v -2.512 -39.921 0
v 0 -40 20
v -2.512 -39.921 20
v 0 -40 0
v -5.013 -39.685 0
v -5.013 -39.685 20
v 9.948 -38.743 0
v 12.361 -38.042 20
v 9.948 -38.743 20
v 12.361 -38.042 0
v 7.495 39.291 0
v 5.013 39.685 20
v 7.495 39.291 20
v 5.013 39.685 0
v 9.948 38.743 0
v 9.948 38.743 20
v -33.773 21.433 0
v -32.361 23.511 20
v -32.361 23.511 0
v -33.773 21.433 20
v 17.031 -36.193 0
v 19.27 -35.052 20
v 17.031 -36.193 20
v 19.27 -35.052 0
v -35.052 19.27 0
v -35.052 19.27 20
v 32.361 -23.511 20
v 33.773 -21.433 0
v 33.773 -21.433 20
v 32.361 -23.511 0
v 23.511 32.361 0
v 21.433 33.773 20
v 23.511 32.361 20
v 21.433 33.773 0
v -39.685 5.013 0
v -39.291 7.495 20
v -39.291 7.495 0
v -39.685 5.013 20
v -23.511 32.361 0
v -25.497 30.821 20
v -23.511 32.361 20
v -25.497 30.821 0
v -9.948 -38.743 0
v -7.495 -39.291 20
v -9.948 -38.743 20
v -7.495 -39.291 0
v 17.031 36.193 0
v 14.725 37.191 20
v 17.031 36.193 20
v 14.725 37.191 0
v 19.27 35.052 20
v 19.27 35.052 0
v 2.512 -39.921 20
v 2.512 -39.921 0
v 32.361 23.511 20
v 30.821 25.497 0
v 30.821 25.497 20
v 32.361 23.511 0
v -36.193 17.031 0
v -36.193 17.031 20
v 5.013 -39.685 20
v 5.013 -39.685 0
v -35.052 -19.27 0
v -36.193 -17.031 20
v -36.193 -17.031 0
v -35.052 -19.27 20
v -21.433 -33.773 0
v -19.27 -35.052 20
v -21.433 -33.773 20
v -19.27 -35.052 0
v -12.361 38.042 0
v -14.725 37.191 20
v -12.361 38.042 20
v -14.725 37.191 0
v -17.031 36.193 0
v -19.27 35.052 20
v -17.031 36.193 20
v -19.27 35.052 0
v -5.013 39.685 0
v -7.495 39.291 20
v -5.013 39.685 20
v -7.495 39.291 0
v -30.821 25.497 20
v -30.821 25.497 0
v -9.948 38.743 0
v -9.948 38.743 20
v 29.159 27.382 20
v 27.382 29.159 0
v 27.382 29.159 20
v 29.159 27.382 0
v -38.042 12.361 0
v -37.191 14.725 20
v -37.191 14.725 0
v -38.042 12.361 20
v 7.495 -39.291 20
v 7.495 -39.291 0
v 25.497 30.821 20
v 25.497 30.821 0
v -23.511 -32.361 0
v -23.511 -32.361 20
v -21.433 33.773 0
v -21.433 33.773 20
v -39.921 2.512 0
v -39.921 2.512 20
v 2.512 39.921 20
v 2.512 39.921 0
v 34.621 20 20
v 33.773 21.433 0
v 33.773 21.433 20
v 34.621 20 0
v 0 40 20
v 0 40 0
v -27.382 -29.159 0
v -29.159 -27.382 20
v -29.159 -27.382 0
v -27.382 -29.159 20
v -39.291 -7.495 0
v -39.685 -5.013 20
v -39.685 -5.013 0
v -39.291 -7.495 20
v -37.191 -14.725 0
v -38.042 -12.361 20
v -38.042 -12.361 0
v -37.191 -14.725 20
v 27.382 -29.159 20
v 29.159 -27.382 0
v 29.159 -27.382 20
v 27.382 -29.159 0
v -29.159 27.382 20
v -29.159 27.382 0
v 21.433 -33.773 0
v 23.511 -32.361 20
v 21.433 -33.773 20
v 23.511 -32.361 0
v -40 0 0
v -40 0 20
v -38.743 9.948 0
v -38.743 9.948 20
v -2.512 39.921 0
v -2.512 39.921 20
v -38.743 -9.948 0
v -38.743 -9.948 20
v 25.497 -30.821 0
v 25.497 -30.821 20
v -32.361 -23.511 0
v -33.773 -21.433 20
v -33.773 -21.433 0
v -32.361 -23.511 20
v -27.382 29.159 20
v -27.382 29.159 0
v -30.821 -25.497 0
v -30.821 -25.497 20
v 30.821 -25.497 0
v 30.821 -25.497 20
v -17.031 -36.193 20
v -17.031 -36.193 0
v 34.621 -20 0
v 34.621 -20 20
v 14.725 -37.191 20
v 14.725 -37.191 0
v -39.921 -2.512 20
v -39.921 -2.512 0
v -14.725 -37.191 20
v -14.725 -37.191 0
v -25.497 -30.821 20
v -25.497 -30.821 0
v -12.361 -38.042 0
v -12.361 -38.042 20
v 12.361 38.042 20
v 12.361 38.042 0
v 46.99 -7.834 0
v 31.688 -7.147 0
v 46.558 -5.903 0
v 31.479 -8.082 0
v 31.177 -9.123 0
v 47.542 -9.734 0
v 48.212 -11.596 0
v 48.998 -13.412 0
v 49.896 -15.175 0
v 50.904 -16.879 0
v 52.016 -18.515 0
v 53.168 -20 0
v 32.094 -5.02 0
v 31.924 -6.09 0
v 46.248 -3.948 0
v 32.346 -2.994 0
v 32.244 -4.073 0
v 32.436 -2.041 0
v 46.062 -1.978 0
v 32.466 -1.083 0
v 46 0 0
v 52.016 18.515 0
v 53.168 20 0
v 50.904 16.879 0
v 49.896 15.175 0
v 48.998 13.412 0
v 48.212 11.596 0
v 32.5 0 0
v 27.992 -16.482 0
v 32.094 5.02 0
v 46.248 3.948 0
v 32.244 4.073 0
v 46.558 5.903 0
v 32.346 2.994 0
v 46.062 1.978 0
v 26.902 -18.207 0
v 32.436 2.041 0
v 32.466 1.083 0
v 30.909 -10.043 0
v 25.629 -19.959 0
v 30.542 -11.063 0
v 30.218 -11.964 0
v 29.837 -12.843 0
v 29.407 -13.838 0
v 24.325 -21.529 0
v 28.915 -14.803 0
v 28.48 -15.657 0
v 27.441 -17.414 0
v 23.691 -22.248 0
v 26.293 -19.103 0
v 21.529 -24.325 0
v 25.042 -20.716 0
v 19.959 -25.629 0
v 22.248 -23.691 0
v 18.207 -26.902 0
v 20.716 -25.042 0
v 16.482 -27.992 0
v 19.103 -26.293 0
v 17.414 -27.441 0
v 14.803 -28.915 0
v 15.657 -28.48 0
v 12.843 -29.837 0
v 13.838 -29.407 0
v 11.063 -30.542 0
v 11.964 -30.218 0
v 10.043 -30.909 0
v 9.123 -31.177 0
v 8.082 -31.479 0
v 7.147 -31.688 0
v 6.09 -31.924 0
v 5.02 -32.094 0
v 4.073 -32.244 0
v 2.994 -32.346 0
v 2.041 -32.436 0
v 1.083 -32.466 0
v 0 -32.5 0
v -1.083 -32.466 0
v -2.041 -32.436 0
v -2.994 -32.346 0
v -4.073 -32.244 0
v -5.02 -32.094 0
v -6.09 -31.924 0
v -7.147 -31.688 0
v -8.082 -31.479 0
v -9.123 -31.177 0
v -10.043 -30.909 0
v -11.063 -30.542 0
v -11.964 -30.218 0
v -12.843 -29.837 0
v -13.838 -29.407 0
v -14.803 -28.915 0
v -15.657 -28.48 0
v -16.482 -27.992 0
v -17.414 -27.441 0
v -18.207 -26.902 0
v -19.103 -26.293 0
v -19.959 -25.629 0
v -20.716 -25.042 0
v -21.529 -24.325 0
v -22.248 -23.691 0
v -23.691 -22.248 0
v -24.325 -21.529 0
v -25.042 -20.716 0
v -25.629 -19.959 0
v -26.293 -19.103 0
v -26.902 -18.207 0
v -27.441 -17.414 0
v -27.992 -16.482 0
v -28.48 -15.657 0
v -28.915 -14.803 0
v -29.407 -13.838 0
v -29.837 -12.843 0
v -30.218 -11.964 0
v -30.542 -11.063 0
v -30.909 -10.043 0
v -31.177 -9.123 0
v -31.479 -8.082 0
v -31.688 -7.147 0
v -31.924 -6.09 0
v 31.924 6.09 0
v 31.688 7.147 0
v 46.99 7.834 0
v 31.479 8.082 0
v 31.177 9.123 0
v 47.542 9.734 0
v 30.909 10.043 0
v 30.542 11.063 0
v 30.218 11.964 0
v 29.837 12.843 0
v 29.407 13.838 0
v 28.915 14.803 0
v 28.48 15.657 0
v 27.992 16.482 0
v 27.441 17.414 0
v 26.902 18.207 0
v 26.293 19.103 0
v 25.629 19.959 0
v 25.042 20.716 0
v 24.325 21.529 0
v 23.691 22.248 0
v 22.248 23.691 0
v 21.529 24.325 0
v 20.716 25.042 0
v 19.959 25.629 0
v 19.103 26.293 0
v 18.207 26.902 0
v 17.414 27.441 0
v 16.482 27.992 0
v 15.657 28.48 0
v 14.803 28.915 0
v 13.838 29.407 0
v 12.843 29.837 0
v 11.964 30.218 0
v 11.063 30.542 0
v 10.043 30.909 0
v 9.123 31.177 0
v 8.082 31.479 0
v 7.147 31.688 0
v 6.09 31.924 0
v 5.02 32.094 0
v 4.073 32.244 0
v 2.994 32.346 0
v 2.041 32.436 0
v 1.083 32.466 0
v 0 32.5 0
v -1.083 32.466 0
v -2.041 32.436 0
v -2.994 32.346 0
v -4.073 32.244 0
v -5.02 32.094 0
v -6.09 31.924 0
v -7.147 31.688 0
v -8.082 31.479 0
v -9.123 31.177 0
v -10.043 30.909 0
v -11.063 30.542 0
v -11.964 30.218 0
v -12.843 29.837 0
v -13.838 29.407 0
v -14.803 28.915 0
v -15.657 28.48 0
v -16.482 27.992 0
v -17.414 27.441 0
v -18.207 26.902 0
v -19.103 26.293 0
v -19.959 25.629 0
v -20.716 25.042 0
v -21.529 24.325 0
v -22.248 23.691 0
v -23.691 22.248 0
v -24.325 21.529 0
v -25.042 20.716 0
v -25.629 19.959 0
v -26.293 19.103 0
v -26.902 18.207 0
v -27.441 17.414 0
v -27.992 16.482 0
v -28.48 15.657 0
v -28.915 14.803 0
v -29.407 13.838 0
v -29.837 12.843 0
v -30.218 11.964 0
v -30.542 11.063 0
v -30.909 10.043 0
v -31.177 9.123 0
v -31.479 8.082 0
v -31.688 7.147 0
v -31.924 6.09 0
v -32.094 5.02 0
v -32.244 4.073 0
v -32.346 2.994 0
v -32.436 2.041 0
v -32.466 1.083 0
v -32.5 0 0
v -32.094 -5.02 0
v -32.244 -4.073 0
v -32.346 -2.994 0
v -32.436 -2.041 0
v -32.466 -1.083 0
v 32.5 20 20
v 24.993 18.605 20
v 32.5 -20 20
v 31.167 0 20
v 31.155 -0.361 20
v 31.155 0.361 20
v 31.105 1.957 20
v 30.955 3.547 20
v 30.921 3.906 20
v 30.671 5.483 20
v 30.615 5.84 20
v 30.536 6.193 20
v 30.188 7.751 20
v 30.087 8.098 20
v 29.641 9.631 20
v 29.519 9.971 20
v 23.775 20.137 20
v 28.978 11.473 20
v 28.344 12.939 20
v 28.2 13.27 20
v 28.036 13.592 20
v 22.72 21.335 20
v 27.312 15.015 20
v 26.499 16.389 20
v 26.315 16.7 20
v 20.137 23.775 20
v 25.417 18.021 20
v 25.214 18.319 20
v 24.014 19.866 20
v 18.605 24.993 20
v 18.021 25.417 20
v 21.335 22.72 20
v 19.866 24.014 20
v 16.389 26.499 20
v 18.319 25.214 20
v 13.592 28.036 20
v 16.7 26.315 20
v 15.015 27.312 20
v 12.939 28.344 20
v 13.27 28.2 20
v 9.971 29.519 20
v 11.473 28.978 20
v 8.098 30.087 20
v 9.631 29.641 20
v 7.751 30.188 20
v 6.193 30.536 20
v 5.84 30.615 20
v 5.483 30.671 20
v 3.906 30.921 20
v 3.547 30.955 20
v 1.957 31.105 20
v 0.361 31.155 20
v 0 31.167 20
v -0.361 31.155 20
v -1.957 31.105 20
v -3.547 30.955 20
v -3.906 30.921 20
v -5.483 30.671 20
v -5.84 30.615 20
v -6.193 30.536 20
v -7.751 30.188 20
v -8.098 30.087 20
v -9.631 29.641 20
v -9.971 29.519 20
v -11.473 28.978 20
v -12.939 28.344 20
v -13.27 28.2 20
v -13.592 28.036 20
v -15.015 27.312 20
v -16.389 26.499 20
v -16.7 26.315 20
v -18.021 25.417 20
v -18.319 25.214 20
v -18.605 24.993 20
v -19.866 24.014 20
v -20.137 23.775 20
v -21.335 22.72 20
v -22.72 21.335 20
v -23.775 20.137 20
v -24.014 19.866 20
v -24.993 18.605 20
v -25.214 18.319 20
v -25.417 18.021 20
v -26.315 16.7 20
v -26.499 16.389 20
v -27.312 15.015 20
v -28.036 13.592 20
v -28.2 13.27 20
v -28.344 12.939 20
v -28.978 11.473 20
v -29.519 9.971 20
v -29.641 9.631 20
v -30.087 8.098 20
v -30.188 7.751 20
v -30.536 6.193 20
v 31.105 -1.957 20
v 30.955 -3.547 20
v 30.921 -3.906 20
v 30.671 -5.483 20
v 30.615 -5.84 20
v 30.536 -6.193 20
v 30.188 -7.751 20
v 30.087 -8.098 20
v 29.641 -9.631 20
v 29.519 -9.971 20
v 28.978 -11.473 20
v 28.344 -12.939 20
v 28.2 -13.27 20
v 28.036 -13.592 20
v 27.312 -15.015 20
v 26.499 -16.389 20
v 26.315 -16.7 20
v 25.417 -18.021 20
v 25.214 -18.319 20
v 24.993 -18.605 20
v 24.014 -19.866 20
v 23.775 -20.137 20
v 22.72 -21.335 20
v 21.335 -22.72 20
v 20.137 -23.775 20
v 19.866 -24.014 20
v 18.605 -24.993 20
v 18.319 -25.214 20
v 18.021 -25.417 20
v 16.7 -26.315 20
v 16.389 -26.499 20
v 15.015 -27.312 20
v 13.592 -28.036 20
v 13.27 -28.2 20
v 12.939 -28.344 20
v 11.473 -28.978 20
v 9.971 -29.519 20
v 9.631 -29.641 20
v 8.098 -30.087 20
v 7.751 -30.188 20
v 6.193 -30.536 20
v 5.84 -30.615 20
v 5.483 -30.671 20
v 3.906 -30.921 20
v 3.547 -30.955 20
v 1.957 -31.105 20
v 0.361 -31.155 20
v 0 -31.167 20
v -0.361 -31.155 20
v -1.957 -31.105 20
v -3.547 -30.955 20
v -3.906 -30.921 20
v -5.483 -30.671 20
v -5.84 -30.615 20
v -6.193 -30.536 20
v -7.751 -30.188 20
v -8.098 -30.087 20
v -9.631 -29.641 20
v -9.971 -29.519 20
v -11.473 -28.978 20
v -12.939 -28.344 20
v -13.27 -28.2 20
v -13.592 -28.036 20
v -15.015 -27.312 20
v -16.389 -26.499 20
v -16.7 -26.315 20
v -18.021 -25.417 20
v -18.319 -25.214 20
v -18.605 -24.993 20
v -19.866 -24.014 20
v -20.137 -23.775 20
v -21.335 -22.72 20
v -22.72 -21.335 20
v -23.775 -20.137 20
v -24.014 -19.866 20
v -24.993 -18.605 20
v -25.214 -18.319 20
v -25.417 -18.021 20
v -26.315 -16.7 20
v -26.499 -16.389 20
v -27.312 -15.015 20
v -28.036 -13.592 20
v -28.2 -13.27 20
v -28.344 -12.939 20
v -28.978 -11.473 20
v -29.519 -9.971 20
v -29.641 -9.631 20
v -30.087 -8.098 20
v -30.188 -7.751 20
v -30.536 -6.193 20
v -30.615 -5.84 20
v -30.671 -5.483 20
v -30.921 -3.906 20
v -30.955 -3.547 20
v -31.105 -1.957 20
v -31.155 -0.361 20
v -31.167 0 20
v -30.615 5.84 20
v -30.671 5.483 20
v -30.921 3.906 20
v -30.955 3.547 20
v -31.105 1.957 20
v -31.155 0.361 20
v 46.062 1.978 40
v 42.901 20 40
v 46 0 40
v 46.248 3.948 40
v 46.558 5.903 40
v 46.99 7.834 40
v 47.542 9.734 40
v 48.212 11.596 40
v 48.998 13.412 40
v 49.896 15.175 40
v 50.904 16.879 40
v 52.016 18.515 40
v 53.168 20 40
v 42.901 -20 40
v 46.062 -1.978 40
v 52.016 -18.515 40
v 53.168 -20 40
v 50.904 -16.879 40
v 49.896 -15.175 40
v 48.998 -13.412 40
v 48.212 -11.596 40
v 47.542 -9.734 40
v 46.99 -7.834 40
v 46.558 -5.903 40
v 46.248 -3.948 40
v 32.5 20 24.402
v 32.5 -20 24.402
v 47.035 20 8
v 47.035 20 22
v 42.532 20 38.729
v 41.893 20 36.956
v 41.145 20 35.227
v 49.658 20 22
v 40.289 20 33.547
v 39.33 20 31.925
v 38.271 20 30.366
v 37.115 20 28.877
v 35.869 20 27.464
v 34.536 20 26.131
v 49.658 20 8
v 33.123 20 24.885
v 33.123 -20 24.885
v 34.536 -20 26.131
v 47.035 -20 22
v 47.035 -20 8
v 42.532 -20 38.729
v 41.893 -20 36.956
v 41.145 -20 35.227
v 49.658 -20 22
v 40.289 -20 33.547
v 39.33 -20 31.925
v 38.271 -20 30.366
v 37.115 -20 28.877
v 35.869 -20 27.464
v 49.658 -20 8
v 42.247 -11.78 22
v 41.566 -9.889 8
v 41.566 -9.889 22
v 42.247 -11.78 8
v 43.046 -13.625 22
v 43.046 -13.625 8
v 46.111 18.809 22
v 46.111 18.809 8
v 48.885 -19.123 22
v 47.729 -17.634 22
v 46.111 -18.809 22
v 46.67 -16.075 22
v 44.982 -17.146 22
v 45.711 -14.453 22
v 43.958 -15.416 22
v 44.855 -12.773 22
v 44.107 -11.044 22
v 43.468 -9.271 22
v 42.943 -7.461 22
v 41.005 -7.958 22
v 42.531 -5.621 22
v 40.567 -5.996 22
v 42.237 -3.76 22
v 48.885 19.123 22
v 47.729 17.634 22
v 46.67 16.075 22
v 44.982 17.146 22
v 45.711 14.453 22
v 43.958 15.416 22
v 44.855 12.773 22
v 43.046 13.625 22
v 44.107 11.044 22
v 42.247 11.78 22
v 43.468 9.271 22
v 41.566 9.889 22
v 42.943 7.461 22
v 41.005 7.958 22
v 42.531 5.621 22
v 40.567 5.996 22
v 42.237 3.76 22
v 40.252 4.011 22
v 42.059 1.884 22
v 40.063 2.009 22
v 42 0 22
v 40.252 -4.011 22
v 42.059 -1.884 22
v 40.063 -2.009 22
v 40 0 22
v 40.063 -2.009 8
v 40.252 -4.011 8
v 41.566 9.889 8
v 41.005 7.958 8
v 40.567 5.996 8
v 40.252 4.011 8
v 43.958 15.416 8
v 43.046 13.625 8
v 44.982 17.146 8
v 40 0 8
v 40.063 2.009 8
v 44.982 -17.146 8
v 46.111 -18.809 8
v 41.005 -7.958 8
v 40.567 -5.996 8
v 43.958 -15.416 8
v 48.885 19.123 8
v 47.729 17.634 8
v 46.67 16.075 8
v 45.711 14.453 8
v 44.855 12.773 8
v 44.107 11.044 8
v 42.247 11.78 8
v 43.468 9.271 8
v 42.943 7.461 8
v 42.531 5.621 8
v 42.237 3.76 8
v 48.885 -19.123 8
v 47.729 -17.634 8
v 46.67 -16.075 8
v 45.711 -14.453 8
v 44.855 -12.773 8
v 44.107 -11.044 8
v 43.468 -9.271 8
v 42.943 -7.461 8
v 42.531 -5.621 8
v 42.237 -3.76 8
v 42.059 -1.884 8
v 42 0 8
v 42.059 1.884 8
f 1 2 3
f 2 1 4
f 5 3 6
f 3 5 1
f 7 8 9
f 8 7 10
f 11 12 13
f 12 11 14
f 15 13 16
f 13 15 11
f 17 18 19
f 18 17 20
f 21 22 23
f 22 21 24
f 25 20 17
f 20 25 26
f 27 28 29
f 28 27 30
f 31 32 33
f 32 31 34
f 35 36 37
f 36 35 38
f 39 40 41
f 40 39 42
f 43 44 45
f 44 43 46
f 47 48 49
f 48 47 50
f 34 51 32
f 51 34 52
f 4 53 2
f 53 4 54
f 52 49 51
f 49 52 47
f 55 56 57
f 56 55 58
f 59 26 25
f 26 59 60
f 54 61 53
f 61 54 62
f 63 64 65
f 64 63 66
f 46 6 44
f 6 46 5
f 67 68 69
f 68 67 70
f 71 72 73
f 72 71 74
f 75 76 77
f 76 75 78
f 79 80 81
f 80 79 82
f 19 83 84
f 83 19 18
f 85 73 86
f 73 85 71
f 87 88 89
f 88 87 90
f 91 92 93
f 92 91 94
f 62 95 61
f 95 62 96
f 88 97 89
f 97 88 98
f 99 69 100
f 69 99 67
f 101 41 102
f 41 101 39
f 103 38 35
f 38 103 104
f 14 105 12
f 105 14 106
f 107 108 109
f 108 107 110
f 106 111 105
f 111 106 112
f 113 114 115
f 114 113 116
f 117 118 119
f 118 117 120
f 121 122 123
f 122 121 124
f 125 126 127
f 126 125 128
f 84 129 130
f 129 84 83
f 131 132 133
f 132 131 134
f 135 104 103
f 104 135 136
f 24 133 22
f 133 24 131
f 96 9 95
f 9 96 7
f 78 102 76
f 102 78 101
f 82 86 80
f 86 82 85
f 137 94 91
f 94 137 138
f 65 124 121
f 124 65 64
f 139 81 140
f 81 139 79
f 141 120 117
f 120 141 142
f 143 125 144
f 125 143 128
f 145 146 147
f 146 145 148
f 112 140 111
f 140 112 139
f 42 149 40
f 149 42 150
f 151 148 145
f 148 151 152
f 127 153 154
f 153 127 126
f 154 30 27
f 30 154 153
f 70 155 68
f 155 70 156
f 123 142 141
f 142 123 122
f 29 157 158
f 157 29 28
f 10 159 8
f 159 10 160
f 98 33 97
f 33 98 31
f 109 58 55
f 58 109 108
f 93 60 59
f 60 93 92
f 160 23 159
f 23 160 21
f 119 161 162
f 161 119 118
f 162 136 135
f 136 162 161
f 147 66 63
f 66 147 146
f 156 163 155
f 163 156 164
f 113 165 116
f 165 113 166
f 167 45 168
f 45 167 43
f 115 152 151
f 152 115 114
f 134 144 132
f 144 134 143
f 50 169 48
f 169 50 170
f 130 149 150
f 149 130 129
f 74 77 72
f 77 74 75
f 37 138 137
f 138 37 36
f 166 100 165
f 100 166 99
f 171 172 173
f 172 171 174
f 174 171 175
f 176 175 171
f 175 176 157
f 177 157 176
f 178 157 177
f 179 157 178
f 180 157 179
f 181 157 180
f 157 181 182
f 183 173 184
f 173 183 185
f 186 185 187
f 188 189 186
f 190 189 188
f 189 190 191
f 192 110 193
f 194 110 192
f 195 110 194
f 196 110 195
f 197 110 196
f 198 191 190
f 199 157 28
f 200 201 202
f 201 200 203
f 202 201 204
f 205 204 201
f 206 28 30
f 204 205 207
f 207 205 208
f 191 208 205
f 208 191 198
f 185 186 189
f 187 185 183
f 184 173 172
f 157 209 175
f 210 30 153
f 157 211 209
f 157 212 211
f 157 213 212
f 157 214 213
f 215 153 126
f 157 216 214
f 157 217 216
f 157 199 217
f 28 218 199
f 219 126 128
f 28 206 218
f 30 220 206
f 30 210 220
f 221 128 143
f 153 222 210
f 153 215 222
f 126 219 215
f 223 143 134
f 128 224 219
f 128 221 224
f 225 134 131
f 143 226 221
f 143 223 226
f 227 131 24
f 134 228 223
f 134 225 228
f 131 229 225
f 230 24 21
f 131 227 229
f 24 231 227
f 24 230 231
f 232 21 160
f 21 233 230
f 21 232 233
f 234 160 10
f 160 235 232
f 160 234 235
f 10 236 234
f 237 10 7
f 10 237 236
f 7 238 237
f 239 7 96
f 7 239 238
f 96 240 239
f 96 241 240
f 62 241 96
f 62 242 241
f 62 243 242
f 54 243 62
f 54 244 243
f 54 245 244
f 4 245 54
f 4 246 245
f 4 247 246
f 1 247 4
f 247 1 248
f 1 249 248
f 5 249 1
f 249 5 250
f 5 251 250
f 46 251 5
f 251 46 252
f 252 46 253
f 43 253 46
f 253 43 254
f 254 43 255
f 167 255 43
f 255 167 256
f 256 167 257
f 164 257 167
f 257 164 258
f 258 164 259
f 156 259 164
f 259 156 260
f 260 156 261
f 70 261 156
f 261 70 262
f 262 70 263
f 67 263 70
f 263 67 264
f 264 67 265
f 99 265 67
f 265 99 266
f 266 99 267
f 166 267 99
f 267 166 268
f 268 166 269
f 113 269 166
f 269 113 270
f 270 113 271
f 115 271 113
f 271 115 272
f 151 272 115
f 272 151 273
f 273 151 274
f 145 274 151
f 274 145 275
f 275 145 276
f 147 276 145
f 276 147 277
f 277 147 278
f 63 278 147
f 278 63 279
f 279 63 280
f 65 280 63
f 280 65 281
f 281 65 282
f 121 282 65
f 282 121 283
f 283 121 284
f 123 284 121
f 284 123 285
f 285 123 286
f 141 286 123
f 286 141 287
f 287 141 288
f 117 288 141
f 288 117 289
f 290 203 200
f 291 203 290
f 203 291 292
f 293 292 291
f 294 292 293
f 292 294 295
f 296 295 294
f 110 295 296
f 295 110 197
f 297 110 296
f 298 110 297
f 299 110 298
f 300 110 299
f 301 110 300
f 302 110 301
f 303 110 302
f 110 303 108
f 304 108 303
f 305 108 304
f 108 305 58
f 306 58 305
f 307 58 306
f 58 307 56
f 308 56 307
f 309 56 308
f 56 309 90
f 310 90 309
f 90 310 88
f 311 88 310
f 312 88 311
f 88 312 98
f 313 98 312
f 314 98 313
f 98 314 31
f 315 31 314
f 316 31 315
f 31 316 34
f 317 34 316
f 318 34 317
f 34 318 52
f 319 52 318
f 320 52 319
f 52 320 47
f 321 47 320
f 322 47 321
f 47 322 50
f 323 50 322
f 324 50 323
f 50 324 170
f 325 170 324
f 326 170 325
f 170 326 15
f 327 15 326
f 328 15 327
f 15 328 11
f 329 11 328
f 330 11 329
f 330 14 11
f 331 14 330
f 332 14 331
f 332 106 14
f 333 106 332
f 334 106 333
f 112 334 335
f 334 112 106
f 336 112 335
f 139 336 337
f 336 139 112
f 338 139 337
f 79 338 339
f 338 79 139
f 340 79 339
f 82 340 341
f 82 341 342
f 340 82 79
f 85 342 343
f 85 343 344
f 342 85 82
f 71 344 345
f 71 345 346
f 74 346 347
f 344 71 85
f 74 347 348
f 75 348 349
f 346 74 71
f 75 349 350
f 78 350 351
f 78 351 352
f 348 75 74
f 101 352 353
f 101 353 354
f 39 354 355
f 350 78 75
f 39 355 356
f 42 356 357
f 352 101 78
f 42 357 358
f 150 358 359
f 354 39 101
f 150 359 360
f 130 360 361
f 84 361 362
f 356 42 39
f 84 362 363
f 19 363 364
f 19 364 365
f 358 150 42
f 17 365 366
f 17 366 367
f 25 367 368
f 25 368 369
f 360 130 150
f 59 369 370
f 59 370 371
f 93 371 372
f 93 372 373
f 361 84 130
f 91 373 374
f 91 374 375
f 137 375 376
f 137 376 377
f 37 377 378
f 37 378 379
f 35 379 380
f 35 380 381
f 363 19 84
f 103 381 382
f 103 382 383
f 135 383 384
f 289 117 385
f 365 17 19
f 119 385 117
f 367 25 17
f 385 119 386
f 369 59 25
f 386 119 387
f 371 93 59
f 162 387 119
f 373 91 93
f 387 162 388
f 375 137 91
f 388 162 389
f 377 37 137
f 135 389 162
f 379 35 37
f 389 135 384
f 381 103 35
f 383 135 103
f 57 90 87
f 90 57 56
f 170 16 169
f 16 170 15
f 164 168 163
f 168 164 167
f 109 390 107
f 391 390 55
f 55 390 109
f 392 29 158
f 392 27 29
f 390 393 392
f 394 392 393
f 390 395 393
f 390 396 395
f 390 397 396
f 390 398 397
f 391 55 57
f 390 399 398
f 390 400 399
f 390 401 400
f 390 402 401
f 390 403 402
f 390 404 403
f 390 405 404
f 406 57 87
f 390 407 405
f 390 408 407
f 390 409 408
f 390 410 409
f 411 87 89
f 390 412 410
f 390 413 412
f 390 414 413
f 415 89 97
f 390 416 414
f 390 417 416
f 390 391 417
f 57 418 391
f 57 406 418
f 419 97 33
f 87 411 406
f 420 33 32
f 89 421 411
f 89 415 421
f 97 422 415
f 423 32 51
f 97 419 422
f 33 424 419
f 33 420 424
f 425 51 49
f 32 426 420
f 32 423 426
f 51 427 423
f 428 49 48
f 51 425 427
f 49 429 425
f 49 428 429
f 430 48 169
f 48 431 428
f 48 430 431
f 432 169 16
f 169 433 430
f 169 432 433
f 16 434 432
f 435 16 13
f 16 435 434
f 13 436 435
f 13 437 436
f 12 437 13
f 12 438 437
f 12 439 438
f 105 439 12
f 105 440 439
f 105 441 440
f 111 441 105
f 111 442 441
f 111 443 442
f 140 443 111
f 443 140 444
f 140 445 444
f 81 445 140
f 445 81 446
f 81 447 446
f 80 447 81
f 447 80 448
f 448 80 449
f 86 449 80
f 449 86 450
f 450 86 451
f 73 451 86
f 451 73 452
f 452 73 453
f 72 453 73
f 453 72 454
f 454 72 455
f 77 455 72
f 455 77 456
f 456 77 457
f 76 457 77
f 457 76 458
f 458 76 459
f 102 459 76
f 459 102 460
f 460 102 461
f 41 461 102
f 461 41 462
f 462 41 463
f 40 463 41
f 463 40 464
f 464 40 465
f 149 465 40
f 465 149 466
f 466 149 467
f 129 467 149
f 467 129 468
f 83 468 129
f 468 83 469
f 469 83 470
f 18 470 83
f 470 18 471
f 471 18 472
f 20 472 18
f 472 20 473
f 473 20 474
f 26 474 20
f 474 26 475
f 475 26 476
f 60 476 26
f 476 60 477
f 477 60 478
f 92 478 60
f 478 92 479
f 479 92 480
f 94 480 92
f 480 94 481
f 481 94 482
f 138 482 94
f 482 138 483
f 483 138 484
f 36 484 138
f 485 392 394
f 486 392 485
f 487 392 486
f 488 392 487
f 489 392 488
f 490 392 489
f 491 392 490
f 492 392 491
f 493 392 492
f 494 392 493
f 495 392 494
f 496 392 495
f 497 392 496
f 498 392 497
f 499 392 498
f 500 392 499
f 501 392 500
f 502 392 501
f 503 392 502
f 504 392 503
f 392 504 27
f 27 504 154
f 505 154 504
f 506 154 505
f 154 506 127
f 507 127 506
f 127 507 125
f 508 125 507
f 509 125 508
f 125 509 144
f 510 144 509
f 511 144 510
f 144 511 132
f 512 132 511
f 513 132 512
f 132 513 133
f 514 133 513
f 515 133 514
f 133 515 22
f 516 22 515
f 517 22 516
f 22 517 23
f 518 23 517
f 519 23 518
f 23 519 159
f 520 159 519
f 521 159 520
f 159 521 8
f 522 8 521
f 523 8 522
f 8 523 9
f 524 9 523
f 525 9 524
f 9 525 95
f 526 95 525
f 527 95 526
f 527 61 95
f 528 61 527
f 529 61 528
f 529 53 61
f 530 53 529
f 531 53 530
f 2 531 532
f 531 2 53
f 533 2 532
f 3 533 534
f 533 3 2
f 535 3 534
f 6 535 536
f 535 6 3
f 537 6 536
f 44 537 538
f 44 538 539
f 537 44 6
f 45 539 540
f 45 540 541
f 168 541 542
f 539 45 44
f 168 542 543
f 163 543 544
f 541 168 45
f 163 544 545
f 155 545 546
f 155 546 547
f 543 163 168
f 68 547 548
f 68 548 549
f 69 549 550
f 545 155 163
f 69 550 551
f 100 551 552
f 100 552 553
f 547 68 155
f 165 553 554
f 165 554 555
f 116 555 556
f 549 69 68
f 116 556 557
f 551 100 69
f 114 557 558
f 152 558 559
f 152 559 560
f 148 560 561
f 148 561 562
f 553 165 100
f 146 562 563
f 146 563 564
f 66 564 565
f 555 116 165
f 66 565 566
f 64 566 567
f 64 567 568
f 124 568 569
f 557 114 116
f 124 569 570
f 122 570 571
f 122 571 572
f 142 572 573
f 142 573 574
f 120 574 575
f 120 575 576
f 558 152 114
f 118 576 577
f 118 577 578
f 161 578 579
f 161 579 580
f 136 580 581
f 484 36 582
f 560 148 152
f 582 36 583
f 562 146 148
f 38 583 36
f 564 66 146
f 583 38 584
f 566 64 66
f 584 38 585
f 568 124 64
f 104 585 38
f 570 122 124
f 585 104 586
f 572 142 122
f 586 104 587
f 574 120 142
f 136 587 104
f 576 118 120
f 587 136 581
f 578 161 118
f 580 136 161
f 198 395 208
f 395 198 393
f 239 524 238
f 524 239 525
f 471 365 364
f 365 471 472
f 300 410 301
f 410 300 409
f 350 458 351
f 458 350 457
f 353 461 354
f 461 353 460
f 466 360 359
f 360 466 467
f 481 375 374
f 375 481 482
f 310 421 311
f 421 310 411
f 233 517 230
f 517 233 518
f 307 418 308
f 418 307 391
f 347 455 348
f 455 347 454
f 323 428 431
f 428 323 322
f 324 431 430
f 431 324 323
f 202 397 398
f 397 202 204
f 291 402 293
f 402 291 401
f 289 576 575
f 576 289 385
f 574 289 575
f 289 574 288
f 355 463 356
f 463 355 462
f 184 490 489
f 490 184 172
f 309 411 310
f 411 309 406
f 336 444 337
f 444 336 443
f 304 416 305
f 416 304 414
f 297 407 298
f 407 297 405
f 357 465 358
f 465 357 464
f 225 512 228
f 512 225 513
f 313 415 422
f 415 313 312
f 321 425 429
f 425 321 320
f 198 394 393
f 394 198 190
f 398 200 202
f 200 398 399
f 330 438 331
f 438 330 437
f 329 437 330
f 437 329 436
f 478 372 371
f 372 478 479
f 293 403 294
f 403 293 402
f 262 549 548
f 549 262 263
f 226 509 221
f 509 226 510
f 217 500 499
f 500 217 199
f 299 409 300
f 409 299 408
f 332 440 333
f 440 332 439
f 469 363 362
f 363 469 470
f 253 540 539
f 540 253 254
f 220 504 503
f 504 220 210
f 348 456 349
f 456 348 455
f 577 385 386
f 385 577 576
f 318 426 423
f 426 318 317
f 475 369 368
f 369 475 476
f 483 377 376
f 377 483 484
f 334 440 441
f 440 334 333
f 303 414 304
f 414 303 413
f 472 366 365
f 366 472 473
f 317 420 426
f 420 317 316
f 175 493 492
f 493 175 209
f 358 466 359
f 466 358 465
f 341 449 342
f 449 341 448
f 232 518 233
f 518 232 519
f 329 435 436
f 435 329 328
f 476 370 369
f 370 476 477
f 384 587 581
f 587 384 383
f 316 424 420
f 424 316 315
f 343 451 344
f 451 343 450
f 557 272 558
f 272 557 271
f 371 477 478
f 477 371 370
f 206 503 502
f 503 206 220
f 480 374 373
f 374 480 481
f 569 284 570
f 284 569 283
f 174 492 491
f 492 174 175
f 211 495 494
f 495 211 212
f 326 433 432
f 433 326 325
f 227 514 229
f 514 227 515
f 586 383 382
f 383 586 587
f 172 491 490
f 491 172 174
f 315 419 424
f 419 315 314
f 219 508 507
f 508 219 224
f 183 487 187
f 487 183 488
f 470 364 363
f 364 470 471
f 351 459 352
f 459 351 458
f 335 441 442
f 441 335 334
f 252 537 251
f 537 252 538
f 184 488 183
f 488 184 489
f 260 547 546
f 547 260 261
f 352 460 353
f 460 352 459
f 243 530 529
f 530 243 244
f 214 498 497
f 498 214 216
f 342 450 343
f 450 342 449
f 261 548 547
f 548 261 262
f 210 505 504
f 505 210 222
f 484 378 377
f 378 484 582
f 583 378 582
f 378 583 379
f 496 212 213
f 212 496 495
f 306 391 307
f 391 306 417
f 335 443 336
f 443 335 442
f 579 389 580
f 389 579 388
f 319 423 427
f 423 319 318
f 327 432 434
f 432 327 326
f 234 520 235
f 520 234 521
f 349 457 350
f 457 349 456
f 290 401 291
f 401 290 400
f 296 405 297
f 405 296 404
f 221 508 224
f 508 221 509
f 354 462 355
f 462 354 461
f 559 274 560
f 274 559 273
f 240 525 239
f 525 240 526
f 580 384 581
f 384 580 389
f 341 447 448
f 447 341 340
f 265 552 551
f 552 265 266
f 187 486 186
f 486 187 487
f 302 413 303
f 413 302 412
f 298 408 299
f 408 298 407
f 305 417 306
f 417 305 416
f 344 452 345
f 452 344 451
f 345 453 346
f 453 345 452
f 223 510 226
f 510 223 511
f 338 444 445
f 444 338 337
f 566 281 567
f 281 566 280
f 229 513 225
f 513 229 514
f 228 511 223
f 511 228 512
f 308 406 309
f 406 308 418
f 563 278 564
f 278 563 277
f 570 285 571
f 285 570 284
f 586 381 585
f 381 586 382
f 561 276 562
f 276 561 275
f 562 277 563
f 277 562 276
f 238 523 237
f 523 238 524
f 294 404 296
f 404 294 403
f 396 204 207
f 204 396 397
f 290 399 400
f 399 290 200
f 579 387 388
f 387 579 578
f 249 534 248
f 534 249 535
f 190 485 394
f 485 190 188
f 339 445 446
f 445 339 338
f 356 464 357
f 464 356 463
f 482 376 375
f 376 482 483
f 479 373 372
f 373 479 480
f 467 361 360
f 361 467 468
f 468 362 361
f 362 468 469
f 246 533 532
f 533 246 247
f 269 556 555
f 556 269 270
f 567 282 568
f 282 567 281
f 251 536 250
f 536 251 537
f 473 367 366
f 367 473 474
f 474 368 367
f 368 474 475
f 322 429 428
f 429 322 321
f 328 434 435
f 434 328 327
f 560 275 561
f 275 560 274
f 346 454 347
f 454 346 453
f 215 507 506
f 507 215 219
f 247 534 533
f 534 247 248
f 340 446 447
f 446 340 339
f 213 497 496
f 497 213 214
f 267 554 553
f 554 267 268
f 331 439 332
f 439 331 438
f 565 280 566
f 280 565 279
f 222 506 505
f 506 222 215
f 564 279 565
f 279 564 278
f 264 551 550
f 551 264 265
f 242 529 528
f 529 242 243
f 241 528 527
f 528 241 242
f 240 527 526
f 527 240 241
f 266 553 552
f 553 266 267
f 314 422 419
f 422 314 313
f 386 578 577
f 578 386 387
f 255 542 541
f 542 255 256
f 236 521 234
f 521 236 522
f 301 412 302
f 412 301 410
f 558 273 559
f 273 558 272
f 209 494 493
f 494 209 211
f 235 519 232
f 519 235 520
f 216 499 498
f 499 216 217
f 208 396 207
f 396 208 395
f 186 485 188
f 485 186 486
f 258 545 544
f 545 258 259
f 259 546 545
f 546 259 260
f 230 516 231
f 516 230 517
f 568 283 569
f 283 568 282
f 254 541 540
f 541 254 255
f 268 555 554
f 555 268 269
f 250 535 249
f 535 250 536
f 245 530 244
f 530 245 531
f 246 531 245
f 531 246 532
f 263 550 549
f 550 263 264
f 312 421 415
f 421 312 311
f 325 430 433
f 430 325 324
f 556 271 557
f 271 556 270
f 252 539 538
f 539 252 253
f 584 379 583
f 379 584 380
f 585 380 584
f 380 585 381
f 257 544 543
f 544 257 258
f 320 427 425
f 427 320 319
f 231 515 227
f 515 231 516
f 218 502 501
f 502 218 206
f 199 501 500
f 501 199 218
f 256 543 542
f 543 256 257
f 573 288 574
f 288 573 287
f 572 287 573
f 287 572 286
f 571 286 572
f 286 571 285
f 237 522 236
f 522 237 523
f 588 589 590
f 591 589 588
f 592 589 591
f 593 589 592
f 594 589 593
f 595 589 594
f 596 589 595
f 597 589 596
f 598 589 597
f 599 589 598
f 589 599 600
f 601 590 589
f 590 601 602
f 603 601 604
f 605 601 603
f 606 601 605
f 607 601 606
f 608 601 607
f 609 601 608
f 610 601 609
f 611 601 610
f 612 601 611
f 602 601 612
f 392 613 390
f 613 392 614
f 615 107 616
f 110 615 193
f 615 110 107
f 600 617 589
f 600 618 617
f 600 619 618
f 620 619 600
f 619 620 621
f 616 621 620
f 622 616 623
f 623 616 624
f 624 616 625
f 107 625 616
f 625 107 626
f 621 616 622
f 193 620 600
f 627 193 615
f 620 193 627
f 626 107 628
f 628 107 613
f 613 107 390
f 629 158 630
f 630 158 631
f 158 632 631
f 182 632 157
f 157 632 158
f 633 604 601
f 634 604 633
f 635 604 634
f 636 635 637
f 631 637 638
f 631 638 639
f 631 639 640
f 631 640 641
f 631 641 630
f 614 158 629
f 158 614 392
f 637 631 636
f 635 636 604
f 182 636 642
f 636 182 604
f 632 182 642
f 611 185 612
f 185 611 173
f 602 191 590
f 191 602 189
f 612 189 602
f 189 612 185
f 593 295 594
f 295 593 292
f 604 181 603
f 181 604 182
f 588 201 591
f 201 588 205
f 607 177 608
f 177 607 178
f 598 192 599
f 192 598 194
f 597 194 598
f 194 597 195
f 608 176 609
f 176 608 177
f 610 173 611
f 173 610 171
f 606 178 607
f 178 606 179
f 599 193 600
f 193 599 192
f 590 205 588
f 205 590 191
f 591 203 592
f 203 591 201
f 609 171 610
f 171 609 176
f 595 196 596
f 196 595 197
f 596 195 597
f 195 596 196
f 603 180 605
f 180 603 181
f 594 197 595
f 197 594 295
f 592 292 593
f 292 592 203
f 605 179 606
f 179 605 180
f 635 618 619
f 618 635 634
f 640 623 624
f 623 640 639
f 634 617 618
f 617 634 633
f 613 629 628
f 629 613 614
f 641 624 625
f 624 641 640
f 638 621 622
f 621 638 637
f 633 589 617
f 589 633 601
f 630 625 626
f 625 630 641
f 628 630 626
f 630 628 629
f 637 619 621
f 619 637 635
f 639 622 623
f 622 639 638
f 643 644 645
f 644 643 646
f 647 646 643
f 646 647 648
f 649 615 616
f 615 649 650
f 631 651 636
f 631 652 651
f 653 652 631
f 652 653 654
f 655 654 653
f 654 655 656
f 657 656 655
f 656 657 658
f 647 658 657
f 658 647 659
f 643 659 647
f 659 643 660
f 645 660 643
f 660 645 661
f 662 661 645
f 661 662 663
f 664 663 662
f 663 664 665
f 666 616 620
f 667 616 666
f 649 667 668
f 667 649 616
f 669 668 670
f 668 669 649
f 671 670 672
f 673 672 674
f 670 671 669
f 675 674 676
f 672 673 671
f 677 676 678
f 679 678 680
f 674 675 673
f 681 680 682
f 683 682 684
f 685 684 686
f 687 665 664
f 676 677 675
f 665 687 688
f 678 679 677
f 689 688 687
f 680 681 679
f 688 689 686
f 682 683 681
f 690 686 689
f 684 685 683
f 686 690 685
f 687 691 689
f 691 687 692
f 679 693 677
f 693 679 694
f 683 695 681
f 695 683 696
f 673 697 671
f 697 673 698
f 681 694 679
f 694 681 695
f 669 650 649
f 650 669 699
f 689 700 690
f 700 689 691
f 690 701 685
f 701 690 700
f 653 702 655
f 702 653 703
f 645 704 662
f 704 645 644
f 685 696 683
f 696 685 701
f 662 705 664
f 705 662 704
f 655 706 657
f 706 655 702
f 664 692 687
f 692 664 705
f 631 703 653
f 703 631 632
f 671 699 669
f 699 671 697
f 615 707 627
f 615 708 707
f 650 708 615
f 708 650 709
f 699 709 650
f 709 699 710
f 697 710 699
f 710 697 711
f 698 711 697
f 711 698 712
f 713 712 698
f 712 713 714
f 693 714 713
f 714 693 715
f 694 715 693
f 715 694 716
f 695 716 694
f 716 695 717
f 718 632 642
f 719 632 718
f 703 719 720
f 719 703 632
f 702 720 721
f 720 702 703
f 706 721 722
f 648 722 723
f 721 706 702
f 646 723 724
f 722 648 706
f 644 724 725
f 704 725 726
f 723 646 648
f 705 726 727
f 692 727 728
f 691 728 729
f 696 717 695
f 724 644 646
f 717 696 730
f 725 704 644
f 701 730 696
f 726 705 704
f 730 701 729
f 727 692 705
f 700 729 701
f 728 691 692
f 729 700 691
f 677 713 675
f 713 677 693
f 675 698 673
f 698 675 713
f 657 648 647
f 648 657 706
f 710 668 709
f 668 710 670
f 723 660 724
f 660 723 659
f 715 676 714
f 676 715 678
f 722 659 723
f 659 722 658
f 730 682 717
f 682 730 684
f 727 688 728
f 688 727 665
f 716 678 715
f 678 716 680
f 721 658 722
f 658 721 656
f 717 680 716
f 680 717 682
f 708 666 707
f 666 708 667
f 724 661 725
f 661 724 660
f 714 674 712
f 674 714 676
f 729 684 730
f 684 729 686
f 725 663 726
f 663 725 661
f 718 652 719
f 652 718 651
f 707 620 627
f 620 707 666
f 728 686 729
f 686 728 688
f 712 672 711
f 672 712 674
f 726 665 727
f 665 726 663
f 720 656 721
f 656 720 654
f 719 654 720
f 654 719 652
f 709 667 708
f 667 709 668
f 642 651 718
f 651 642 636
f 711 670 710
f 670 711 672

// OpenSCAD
/* NOTES:
	writecylinder(text="text",where=[0,0,0],radius=20,height=40);
	
	Required Parameters (If supplied in this order, identifier is not required)
		text="text"	 	: Text to be written
		where=[x,y,z]	: coordinates of cylinder
		radius=mm 		: radius of cylinder
		height=mm 		: height of cylinder

	Optional Parameter:
		center=boolean :	use this to specify that cylinder is centered on coordinates
					(default is center=false)
		face="top" : Top of cylinder
		face="bottom": bottom of cylinder
		face="front" :barrel of cylinder (default if not supplied)	

	Optional Parameters: (face is not "top" or "bottom")
		east=degrees : west= degrees: (moves text east or west around z)
		up=mm or down=mm : moves text up or down along Z axis
		rotate=degrees : rotates text around Y axis (spirals around cylinder)
	
	Optional Parameters: (face="top" or face="bottom")
		east=degrees or west=degrees : rotate text east or west around top
		rotate=degrees : (similar to east west but not dependant on text orientation)
		ccw=boolean : If true, writes in a counter clockwise direction. (default=false)
		middle=mm :moves the text ?mm toward center of top or bottom surface 	

*/

use <WriteSVG.scad>


 //-- Parmetros del vaso
/* grosor = 20;
 diam_ext=80;
 diam_int = 63.3; 
 texto = "Gonzalo";
diam_tubo = 60;
*/

// Aro
module aro(grosor_aro=20,  diam_ext=80, diam_int = 63.3, texto = "Gonzalo")
{
 // Exterior Aro
 difference(){
  difference() {
     //-- Base de la rueda
    cylinder(r=diam_ext/2,h=grosor_aro,  $fn=100);
	rotate([0,180,-90])
	translate([0,0,-20])
    	writecylinder(texto,[0,0,0],diam_ext/2-0.7,grosor_aro);
   } 

    //-- Taladro aro
   cylinder(r1=diam_int/2+2, r2=diam_int/2-2,h=grosor_aro*3,$fn=100,center=true);
 }
}

//Base asa
module base_asa(altura=40, diam_int = 63.3, diam_ext=80, diam_tubo = 60)
{
difference(){
difference(){
 translate([diam_int/2,-20,0])
 cube([30,40,altura]);

translate([(diam_ext+diam_tubo)/2+6,0,altura/2])
  cylinder(r=diam_tubo/2, h=altura*2,$fn=100,center=true);
}

translate([14,21,48])
rotate([90,0,0])
cylinder(r=60/2,h=42,  $fn=100);
}
}

//Cuerpdel soporte del vaso
module cuerpo_sv(grosor_aro=20,  diam_ext=80, diam_int = 65, texto = "Gonzalo",altura=40, diam_tubo = 63){
 aro(grosor_aro,  diam_ext, diam_int, texto);
 base_asa(altura, diam_int, diam_ext, diam_tubo);
}

module agarradera( diam_ext=80, diam_int = 63.3, altura_ag=12, ancho_ag=2, diam_tubo = 60){
difference(){
  	translate([(diam_ext+diam_tubo)/2+3,0,0])
	cylinder(r=diam_tubo/2+ancho_ag, h=altura_ag,$fn=100);

  	translate([(diam_ext+diam_tubo)/2+3,0,-altura_ag*2])
	cylinder(r=diam_tubo/2, h=altura_ag*4,$fn=100);
}
}

module agarraderas( altura_asa=40, diam_ext=78, diam_int = 63.3, altura_ag=14, ancho_ag=2, diam_tubo = 60){
separacion=(altura_asa-altura_ag*2)/3;
translate([0,0,separacion*2])
agarradera(diam_ext, diam_int , altura_ag, ancho_ag, diam_tubo );

// Una agarradera es suficiente. La de más abajo no es necesaria
/*translate([0,0,separacion*2+altura_ag])
agarradera(diam_ext, diam_int , altura_ag, ancho_ag, diam_tubo );
*/
}

module soporte_vaso(){
	difference(){	
		cuerpo_sv();
		agarraderas();
	}
}
/*difference(){	
soporte_vaso();
color("Red")
translate([14,21,48])
rotate([90,0,0])
cylinder(r=60/2,h=42,  $fn=100);
}*/

soporte_vaso();
